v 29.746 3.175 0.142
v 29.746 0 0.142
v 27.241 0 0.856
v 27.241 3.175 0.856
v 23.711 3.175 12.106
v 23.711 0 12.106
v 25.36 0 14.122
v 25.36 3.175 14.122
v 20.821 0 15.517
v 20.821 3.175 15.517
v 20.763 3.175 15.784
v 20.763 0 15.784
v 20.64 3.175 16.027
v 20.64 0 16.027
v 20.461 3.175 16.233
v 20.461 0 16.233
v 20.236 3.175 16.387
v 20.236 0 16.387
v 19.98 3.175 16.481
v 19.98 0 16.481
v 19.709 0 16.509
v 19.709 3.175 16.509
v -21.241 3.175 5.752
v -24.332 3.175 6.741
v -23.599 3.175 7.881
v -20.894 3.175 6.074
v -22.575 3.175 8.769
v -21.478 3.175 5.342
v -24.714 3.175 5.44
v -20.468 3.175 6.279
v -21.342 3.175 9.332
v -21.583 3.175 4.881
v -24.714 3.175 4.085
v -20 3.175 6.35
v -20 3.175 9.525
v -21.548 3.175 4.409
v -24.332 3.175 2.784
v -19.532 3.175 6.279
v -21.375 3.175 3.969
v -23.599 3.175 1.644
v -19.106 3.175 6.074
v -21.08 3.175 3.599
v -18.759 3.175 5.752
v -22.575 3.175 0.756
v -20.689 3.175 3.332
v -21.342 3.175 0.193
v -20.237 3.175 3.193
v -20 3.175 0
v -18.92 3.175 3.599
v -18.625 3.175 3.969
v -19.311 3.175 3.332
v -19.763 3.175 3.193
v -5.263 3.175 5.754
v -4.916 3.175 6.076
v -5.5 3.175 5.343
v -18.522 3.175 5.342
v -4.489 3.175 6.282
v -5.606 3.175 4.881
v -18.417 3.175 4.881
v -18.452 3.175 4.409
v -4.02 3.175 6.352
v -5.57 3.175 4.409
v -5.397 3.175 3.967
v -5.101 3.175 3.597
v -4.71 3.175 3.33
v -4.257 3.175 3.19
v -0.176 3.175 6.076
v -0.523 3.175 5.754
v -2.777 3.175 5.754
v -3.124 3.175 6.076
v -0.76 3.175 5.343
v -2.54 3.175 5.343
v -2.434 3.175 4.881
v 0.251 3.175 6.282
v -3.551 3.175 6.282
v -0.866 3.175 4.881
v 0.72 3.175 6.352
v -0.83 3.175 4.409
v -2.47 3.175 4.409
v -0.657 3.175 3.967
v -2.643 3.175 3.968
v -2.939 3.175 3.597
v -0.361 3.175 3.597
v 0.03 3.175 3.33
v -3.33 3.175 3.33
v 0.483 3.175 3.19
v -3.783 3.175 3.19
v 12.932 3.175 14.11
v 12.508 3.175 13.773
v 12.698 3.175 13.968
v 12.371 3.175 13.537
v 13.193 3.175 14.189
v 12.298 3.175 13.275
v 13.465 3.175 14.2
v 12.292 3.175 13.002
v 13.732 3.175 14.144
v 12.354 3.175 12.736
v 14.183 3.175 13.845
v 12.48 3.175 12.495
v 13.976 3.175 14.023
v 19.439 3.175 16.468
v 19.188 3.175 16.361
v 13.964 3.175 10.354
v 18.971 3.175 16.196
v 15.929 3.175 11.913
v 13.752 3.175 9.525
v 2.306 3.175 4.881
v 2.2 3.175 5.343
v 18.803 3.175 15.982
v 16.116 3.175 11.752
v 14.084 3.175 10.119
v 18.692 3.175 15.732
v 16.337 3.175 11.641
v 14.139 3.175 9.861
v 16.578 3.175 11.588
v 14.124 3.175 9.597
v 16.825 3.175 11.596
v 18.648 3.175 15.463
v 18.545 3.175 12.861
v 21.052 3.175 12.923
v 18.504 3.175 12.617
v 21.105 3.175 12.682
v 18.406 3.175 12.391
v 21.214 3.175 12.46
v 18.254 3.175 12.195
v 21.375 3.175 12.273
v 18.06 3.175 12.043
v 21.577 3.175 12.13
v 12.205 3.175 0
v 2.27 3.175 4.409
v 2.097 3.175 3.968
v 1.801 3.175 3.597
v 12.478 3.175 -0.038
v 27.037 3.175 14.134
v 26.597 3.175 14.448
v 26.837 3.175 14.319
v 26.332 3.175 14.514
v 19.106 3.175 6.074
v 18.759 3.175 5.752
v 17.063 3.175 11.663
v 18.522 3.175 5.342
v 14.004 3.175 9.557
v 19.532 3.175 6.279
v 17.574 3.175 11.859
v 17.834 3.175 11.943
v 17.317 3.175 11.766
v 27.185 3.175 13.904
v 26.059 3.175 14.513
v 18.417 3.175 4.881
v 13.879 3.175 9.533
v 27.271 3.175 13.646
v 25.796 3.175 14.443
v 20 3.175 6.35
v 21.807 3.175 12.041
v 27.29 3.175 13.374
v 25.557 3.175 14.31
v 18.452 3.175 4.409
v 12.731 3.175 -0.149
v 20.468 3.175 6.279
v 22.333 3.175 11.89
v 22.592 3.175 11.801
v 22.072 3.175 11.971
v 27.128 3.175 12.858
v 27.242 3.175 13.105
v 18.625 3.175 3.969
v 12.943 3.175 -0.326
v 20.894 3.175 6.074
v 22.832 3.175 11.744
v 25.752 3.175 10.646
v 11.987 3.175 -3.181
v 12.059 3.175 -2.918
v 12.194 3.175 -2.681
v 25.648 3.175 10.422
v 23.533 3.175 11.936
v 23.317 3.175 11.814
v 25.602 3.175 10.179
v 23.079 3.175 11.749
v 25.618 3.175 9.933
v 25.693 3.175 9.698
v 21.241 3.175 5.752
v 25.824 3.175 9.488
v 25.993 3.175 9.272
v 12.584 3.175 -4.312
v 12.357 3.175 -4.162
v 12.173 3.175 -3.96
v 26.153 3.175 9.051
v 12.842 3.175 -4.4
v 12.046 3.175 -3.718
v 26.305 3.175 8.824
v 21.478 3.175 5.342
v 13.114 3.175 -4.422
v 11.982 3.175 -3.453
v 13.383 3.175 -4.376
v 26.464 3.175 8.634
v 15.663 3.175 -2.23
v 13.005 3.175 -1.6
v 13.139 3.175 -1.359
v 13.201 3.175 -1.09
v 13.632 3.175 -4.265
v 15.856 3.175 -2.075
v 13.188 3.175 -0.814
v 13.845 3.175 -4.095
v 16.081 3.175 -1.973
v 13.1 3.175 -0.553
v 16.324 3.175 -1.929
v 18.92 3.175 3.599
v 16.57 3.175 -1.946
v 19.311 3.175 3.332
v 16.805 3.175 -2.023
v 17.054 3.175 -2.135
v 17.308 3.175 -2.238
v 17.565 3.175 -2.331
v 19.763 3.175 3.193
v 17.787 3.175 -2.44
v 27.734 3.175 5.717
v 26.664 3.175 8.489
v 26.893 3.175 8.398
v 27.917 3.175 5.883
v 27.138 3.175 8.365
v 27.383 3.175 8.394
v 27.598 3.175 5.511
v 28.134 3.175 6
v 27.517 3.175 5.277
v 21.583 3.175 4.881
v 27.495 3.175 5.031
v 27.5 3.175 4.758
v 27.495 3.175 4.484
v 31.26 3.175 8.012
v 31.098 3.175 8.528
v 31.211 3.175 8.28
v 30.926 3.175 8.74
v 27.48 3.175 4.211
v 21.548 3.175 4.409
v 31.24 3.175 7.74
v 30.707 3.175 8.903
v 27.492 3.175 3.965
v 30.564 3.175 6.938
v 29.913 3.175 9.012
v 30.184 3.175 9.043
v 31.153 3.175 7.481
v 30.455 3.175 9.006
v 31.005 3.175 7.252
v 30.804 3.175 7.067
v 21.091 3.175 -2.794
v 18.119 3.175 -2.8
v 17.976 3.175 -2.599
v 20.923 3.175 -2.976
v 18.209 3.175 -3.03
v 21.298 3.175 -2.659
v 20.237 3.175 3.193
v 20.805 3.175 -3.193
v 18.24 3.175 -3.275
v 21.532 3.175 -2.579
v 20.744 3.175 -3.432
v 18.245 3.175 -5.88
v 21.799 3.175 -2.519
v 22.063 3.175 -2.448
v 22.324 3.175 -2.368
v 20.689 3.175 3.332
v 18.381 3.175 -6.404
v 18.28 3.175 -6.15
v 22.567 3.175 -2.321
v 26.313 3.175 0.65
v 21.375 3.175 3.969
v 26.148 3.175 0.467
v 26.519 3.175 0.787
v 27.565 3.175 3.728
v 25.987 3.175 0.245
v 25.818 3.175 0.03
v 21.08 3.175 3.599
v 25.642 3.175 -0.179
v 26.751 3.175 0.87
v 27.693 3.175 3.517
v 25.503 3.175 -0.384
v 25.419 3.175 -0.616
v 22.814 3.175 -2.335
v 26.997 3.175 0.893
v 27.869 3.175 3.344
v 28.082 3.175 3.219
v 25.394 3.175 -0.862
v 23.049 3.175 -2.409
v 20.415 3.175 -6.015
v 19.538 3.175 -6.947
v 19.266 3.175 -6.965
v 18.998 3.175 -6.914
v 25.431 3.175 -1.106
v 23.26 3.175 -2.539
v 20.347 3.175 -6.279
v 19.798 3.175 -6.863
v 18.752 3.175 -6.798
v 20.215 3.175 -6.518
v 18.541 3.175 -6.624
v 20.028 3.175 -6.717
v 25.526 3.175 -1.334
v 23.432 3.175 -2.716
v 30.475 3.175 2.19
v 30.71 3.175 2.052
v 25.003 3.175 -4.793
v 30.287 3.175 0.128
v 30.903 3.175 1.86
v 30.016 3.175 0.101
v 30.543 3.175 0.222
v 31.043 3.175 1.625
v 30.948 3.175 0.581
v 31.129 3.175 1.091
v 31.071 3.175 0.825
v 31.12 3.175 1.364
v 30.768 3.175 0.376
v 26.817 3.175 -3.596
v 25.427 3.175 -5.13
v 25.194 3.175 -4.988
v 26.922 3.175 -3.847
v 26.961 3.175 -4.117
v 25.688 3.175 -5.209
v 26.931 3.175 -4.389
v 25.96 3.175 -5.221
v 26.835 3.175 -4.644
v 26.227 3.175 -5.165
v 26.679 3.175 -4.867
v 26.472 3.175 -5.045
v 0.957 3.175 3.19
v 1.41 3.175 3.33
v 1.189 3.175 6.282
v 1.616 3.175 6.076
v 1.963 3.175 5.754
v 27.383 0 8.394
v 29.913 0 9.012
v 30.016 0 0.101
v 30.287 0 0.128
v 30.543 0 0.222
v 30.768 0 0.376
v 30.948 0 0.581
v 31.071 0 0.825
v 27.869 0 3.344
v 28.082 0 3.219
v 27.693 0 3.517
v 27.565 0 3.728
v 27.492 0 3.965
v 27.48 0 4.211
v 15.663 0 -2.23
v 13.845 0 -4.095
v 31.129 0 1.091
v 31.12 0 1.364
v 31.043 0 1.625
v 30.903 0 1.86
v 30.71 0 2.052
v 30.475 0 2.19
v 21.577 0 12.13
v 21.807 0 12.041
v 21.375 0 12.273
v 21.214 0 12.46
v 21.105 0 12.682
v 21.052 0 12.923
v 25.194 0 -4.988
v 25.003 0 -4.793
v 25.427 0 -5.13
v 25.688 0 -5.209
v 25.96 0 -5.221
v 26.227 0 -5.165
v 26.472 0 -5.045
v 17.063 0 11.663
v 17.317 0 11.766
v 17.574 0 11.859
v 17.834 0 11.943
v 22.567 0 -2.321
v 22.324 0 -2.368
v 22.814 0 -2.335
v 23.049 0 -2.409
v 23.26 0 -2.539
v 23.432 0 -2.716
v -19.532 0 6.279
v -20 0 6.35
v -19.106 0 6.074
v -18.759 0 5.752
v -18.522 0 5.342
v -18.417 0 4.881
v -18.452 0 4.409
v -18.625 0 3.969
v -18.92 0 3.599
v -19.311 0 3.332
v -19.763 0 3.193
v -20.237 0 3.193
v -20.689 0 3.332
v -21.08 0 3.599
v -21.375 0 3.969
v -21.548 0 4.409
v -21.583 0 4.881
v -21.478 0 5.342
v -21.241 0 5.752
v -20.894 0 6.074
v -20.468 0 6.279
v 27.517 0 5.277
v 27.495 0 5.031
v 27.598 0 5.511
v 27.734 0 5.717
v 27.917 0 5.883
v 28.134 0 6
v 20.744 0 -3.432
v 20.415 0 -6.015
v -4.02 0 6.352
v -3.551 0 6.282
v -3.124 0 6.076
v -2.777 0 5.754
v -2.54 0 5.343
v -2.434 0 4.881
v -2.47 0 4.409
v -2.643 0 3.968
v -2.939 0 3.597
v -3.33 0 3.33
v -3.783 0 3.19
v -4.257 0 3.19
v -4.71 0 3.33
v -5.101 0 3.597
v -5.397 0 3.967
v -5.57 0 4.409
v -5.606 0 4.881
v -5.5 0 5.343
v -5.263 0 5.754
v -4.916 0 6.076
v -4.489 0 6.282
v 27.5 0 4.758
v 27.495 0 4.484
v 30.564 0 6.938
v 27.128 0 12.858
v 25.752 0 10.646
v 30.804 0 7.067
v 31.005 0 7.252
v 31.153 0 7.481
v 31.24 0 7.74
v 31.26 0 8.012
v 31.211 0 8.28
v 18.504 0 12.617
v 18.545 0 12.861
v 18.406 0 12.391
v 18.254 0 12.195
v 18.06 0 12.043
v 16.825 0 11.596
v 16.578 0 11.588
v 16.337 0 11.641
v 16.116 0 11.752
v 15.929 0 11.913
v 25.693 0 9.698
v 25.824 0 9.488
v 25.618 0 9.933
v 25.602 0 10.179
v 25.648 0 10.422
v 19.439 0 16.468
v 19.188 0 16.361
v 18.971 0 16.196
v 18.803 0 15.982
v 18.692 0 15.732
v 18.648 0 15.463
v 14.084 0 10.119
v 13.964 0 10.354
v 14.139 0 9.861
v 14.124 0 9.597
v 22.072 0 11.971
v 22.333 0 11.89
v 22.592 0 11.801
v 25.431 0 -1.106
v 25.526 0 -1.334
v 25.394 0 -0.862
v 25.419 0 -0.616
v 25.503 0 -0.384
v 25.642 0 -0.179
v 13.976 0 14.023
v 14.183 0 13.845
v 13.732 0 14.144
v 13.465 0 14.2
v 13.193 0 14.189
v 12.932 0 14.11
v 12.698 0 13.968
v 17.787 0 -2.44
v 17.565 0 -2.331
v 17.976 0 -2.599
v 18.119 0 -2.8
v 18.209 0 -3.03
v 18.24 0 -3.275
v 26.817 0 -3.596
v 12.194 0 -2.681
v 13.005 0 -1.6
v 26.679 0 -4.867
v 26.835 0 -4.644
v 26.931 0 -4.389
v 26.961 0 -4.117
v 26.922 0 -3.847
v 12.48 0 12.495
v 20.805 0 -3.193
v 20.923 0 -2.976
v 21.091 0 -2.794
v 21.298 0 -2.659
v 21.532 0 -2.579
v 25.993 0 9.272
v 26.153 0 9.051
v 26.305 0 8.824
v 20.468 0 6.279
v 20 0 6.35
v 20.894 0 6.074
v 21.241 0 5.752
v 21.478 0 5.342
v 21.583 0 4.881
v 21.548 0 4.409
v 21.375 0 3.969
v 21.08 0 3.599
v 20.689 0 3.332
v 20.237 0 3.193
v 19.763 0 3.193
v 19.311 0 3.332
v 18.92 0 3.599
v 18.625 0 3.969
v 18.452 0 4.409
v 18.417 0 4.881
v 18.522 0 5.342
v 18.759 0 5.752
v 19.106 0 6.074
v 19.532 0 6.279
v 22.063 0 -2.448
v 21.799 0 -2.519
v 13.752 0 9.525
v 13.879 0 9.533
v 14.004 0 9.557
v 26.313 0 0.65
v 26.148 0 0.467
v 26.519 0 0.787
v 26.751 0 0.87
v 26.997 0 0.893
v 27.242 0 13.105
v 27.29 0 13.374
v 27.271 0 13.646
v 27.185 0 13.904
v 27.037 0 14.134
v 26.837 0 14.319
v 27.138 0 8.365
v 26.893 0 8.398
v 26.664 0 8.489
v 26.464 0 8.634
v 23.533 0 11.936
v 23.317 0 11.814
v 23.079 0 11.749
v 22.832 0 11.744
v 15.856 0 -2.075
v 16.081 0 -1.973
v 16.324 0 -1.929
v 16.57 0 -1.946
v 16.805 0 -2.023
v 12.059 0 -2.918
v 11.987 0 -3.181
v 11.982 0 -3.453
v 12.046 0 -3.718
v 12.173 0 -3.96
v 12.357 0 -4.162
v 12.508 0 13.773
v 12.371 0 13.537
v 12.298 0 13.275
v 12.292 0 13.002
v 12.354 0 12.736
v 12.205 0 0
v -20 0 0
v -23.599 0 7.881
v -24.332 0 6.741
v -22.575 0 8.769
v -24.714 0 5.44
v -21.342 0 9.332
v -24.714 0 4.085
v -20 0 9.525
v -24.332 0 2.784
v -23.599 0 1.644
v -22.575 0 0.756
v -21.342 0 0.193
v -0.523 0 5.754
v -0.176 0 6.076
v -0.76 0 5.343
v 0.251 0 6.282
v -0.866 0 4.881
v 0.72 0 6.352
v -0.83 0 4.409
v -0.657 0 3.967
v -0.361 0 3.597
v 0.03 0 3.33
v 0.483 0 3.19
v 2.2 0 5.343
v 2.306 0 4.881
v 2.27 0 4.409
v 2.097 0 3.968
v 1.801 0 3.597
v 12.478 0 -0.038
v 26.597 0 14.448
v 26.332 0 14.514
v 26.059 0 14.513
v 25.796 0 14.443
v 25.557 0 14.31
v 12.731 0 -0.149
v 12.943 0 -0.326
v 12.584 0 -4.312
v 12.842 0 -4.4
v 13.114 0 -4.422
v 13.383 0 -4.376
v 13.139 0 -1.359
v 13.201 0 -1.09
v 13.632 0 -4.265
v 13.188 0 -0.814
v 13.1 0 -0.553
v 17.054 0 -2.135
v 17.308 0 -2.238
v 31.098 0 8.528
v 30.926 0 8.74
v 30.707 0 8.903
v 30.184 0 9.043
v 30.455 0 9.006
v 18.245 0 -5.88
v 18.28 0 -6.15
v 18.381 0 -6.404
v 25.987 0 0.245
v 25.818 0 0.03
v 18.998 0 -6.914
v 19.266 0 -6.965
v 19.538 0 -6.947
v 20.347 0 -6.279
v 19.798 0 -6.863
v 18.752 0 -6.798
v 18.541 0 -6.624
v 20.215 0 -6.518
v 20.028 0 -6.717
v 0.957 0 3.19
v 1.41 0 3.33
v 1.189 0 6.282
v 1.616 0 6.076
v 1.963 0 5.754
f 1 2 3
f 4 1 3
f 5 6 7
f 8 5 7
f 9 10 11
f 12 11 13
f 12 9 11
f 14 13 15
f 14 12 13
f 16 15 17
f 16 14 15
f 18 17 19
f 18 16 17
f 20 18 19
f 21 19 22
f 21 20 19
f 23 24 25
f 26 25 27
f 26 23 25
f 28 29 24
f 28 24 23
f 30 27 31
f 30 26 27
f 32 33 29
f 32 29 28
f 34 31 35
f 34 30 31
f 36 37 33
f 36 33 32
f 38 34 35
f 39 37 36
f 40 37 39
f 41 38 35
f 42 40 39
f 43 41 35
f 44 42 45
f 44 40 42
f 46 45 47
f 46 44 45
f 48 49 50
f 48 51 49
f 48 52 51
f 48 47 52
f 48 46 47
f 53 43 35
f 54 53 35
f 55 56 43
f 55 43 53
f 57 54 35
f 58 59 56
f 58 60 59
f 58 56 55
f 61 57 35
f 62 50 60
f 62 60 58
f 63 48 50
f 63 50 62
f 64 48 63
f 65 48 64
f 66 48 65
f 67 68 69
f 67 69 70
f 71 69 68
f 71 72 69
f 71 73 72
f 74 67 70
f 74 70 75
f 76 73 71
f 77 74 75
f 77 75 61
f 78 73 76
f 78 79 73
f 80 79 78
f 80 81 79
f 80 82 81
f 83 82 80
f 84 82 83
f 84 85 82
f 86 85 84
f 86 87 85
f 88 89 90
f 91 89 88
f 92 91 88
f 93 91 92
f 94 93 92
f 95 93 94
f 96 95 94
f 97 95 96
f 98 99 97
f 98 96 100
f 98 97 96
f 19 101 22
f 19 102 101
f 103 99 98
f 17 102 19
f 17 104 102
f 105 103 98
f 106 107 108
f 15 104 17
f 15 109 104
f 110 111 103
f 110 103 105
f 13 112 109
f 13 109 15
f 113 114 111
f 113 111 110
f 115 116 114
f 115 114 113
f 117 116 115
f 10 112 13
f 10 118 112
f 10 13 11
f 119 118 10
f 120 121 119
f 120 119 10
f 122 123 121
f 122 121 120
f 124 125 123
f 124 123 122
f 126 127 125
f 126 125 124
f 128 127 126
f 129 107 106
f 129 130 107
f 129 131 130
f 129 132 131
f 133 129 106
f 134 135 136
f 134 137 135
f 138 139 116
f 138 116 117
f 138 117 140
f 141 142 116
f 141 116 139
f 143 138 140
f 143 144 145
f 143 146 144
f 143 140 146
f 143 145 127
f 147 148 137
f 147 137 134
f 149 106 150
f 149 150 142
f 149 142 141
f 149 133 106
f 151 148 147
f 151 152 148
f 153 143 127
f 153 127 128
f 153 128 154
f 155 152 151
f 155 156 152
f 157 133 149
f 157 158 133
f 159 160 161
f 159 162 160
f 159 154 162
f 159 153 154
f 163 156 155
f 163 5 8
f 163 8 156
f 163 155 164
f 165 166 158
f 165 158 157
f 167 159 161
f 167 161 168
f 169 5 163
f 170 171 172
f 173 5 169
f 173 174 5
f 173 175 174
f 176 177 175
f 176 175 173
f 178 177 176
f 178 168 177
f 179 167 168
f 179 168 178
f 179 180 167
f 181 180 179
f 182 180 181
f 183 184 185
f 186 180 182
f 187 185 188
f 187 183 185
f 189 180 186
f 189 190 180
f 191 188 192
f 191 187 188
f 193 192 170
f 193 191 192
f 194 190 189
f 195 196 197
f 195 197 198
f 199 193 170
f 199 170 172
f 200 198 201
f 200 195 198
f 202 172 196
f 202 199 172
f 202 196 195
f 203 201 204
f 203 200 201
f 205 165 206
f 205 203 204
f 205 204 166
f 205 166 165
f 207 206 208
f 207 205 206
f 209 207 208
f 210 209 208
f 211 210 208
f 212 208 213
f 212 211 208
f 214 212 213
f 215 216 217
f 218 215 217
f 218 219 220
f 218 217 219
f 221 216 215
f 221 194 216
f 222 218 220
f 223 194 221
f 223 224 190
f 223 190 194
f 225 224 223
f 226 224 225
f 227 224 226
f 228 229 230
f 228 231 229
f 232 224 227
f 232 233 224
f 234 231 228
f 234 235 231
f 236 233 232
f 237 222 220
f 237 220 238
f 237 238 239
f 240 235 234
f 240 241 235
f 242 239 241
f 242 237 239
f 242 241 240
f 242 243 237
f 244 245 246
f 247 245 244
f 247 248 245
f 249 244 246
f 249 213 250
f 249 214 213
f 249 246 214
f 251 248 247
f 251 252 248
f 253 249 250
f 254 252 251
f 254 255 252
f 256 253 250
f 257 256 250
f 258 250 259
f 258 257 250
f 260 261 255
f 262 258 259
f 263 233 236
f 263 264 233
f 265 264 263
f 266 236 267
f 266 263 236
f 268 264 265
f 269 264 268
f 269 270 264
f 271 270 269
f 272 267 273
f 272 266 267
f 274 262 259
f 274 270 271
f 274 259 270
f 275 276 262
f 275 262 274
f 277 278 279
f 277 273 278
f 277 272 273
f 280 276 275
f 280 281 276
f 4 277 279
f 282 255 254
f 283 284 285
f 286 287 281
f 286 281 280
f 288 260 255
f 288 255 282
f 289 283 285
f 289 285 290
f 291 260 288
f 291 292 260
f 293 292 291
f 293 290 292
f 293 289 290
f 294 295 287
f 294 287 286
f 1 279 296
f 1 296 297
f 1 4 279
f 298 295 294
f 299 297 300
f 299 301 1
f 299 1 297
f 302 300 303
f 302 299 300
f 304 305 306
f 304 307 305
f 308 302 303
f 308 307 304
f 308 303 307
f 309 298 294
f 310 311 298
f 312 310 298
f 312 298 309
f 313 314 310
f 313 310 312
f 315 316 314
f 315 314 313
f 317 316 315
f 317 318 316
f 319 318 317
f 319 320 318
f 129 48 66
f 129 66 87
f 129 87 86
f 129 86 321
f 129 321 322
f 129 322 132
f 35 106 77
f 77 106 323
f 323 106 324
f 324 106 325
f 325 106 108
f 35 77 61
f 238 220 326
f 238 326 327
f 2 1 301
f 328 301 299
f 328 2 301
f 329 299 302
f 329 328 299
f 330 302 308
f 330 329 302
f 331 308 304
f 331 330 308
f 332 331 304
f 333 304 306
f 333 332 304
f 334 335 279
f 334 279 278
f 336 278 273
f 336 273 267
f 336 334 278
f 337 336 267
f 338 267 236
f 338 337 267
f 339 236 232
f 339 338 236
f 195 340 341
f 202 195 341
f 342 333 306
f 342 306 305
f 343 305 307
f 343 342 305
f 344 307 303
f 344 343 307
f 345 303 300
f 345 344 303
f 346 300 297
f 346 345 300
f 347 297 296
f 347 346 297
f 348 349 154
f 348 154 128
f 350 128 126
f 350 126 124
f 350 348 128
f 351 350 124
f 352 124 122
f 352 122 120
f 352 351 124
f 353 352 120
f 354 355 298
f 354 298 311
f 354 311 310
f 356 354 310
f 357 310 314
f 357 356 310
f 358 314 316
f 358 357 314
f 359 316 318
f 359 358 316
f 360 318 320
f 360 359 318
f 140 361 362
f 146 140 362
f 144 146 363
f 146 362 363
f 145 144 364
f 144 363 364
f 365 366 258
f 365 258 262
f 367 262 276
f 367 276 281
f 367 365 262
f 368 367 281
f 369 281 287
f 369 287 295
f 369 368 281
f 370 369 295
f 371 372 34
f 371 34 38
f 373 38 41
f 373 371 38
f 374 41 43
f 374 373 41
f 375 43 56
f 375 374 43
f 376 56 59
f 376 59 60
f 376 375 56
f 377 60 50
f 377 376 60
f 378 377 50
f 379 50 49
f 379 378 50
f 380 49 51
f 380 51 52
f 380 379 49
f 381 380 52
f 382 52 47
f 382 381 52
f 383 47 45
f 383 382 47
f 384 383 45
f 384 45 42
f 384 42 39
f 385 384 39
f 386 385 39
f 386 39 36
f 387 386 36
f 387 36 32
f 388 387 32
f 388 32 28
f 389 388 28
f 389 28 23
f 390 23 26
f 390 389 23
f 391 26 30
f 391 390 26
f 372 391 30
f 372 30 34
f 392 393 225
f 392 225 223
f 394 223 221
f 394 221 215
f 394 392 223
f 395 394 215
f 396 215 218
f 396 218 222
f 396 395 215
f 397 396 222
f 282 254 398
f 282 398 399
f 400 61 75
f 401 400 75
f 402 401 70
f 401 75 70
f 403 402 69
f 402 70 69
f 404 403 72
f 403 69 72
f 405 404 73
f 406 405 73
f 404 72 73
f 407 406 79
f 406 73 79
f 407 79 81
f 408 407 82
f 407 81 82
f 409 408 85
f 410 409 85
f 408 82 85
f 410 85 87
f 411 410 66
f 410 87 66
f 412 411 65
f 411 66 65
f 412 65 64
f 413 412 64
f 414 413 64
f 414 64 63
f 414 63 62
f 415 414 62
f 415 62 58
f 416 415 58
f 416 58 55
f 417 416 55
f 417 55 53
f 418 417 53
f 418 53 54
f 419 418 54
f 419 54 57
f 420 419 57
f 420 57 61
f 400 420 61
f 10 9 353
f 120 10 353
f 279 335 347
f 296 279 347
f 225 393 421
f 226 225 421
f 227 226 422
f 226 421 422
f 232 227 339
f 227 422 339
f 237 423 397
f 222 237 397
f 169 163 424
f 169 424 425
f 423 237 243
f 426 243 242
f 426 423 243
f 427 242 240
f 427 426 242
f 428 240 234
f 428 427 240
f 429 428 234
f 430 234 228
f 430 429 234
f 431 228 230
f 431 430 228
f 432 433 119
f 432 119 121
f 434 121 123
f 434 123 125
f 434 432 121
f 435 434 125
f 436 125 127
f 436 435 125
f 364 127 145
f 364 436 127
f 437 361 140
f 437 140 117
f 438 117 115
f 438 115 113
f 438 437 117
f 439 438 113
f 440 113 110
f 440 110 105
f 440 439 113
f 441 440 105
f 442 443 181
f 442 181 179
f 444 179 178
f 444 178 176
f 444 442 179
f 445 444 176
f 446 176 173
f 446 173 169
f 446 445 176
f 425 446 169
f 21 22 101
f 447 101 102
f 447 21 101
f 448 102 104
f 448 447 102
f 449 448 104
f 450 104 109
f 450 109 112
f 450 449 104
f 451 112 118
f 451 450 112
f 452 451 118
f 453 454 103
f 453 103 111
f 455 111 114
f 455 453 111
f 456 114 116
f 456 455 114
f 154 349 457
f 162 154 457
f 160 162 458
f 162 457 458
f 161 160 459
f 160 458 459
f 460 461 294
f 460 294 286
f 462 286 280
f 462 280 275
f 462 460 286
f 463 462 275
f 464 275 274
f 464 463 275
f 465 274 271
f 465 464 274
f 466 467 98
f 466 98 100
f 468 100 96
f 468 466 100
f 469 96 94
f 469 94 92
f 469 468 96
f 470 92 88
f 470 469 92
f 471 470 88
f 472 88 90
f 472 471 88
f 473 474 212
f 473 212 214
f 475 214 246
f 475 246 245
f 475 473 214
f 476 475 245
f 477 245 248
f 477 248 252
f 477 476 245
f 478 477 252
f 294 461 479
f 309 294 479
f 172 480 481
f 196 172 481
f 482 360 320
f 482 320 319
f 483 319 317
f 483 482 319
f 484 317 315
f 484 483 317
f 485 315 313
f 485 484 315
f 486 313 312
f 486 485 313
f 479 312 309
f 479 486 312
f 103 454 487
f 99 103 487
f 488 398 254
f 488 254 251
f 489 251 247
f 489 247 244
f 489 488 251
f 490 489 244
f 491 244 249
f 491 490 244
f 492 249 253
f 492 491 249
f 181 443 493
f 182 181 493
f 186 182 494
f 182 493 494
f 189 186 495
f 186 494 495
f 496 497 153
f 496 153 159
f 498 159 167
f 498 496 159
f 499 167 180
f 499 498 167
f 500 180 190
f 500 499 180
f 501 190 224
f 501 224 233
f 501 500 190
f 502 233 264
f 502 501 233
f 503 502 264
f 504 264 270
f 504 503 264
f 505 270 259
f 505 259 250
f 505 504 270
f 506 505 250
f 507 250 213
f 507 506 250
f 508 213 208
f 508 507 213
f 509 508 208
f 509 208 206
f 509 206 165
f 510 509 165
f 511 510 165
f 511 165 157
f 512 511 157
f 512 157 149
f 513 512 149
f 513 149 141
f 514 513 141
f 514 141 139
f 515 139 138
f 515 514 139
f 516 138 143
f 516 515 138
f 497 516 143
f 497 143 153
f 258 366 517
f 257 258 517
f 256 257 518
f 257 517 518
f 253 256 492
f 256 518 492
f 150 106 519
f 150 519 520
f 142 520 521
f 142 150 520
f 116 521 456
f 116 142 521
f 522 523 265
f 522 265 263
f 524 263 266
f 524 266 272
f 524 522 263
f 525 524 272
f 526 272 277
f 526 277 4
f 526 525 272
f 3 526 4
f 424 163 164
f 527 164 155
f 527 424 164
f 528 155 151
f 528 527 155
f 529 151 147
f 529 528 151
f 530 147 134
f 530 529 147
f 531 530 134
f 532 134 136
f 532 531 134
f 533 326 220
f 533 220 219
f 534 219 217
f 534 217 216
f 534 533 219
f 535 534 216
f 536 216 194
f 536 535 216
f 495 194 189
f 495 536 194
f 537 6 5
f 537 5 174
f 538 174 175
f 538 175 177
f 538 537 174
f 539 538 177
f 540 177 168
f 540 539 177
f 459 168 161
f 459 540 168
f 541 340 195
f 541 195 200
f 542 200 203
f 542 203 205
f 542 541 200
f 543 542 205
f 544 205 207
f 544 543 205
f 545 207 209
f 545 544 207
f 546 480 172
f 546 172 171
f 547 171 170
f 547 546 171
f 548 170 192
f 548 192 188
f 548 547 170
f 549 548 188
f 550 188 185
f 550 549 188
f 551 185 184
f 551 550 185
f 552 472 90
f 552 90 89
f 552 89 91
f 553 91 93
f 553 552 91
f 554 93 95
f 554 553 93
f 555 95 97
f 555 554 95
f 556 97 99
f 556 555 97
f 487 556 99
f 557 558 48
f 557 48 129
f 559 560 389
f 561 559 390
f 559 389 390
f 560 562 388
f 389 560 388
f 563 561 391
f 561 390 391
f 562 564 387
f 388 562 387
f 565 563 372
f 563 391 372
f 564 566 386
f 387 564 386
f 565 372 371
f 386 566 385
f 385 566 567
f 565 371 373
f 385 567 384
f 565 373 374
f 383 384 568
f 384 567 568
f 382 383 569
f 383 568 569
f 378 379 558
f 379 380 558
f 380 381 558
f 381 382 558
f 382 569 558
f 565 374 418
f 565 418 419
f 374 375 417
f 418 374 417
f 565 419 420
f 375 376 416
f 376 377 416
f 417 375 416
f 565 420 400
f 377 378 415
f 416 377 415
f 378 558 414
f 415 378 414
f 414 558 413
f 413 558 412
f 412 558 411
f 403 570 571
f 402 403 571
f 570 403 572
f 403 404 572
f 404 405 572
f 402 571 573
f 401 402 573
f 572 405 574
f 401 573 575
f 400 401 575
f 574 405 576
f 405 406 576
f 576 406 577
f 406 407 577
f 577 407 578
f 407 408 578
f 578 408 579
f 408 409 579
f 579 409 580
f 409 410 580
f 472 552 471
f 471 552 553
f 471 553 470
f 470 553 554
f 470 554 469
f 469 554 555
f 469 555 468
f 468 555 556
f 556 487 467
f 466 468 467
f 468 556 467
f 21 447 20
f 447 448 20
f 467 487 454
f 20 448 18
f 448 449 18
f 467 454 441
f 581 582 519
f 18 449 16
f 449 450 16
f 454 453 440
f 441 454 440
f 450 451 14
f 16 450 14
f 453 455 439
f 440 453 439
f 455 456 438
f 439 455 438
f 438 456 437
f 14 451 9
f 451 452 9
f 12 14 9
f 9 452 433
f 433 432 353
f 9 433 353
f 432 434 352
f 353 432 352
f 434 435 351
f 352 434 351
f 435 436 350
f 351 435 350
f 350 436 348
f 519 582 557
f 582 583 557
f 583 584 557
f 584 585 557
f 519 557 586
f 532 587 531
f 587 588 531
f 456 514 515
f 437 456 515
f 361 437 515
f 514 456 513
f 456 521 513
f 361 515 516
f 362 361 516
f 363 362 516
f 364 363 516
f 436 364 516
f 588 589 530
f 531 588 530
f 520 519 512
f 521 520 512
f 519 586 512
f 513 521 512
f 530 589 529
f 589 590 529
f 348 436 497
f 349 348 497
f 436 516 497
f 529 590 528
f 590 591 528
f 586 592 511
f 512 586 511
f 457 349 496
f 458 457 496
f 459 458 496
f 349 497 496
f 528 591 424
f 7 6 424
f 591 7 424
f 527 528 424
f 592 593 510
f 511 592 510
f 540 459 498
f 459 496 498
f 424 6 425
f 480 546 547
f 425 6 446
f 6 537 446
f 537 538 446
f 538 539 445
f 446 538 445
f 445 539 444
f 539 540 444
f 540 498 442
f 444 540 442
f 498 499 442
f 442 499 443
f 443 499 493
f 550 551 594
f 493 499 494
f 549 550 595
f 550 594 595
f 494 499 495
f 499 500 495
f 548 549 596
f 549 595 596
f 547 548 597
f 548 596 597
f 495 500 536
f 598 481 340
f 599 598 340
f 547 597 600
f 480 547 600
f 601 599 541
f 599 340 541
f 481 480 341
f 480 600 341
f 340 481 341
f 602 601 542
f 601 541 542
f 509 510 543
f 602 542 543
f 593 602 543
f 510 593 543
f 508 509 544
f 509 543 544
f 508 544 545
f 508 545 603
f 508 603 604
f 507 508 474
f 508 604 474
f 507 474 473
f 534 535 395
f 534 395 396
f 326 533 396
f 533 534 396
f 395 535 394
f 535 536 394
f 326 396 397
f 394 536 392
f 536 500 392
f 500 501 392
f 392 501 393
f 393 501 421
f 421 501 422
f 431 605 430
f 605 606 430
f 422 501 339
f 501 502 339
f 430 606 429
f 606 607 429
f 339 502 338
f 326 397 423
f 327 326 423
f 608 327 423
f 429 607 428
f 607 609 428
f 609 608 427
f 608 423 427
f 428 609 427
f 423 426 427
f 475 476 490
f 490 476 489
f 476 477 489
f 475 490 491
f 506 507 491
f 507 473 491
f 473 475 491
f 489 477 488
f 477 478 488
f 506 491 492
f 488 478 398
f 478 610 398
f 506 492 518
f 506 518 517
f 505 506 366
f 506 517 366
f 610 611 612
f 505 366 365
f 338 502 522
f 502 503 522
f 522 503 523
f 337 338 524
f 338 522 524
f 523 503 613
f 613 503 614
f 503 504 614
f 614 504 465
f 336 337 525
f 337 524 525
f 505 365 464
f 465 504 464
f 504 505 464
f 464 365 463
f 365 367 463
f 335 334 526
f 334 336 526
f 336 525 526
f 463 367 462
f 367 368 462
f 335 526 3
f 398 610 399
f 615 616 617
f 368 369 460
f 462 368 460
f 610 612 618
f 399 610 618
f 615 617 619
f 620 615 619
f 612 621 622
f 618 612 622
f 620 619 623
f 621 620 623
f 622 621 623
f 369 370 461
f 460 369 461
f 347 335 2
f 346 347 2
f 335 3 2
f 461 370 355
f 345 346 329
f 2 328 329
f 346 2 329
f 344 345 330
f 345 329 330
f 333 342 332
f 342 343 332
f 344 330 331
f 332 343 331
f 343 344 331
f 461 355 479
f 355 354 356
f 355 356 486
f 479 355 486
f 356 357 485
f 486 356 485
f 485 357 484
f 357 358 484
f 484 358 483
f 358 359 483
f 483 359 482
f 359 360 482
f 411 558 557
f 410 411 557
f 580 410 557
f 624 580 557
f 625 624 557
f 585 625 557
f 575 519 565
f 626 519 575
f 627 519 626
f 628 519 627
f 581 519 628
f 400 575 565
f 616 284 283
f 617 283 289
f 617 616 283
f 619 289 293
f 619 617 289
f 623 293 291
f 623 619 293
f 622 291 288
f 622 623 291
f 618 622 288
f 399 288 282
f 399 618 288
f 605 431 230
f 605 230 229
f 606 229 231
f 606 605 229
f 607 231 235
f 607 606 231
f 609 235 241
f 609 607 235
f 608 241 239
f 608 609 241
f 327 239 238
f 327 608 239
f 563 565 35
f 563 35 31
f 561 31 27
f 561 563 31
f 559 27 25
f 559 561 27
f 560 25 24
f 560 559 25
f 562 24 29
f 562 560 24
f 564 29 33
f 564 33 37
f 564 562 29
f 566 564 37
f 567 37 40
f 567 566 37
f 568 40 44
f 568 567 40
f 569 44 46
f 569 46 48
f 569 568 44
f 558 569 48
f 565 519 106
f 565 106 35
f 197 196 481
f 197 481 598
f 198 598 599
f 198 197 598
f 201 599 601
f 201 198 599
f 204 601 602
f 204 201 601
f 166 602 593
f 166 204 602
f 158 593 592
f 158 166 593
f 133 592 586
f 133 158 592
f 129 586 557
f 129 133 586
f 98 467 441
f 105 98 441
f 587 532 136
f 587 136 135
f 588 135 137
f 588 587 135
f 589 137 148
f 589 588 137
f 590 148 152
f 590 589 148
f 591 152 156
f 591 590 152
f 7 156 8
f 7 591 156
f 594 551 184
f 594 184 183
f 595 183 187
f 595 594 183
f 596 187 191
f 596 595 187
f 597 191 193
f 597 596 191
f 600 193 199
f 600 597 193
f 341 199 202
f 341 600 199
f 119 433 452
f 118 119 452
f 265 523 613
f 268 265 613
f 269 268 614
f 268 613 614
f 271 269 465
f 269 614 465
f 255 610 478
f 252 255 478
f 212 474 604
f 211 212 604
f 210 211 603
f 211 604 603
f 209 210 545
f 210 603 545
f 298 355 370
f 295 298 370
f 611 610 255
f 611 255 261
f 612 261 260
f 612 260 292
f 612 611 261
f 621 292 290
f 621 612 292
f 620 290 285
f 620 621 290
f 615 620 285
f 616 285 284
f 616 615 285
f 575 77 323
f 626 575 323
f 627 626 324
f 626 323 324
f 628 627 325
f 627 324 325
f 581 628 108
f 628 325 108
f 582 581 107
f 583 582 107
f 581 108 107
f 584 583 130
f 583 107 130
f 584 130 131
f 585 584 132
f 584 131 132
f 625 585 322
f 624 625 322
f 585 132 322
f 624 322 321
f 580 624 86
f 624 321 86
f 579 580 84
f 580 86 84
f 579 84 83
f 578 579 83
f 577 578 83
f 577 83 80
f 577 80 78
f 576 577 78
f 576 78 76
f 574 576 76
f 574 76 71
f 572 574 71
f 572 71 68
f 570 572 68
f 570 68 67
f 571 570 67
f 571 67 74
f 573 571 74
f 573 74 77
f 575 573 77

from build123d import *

# Parameters (mm, degrees)
CROQUIS1_R              = 1.5875
SALIENTE_EXTRUIR1_DEPTH = 3.175
SALIENTE_EXTRUIR2_START = -3.175
CROQUIS2_R              = 7.5
CROQUIS2_R_2            = 1.5875
SALIENTE_EXTRUIR2_DEPTH = 3.175
SALIENTE_EXTRUIR3_START = -3.175
SALIENTE_EXTRUIR3_DEPTH = 3.175
CORTAR_EXTRUIR4_START   = -10
CORTAR_EXTRUIR4_DEPTH   = 10
MATRIZC1_COUNT          = 8
MATRIZC1_ANGLE          = 259
REDONDEO1_R             = 1
ESQUISSE1_R             = 1.59
ENL_V_MAT_EXTRU_1_DEPTH = 36.494905734


with BuildPart() as part:
    # Croquis1 → Saliente-Extruir1 (new body)
    with BuildSketch(Plane(origin=(0, 0, 0), x_dir=(1, 0, 0), z_dir=(0, 1, 0))):
        with BuildLine():
            Line((-20, 0), (20, 0))
            ThreePointArc((20, 0), (24.7625, -4.7625), (20, -9.525))
            Line((20, -9.525), (-20, -9.525))
            ThreePointArc((-20, -9.525), (-24.7625, -4.7625), (-20, 0))
        make_face()
        with Locations(Location((-20, -4.7625, 0), (0, 0, 270))):
            Circle(CROQUIS1_R, mode=Mode.SUBTRACT)
        with Locations(Location((20, -4.7625, 0), (0, 0, 270))):
            Circle(CROQUIS1_R, mode=Mode.SUBTRACT)
    extrude(amount=SALIENTE_EXTRUIR1_DEPTH)

    # Croquis2 → Saliente-Extruir2 (add)
    with BuildSketch(Plane(origin=(0, 3.175, 0), x_dir=(1, 0, 0), z_dir=(0, 1, 0)).offset(SALIENTE_EXTRUIR2_START)):
        with Locations((20, -4.7625)):
            Circle(CROQUIS2_R)
        with Locations(Location((20, -4.7625, 0), (0, 0, 270))):
            Circle(CROQUIS2_R_2, mode=Mode.SUBTRACT)
    extrude(amount=SALIENTE_EXTRUIR2_DEPTH)

    # Croquis8 → Saliente-Extruir3 (add)
    with BuildSketch(Plane(origin=(0, 3.175, 0), x_dir=(1, 0, 0), z_dir=(0, 1, 0)).offset(SALIENTE_EXTRUIR3_START)):
        with BuildLine():
            Line((11.607813982, 3.461471902), (14.206158981, 0))
            ThreePointArc((14.206158981, 0), (15.121179891, 0.933736858), (16.184441281, 1.694396442))
            Line((16.184441281, 1.694396442), (13.163387879, 4.793819098))
            ThreePointArc((13.163387879, 4.793819098), (12.356515163, 4.161604411), (11.607813982, 3.461471902))
        make_face()
    saliente_extruir3 = extrude(amount=SALIENTE_EXTRUIR3_DEPTH)

    # Croquis9 → Cortar-Extruir4 (cut)
    with BuildSketch(Plane(origin=(0, 3.175, 0), x_dir=(1, 0, 0), z_dir=(0, 1, 0)).offset(CORTAR_EXTRUIR4_START)):
        with BuildLine():
            ThreePointArc((12.35651523, 4.161604469), (11.974526132, 3.819706546), (11.607813982, 3.461471902))
            Line((11.607813982, 3.461471902), (12.19397403, 2.680599255))
            ThreePointArc((12.19397403, 2.680599255), (11.982381708, 3.453243741), (12.35651523, 4.161604469))
        make_face()
        with BuildLine():
            ThreePointArc((13.163387879, 4.793819098), (12.753054069, 4.486514795), (12.35651523, 4.161604469))
            ThreePointArc((12.35651523, 4.161604469), (13.113956627, 4.422436237), (13.844906618, 4.094621057))
            Line((13.844906618, 4.094621057), (13.163387879, 4.793819098))
        make_face()
    cortar_extruir4 = extrude(amount=CORTAR_EXTRUIR4_DEPTH, mode=Mode.SUBTRACT)

    # MatrizC1: Saliente-Extruir3, Cortar-Extruir4 ×8 about axis
    matrizc1_axis = Axis((20, 0, 4.7625), (0, -1, 0))
    add([saliente_extruir3.rotate(matrizc1_axis, i * MATRIZC1_ANGLE / (MATRIZC1_COUNT - 1)) for i in range(1, MATRIZC1_COUNT)])
    add([cortar_extruir4.rotate(matrizc1_axis, i * MATRIZC1_ANGLE / (MATRIZC1_COUNT - 1)) for i in range(1, MATRIZC1_COUNT)], mode=Mode.SUBTRACT)

    # Redondeo1
    # the kernel refuses this fillet: 1 mm, written as the material it adds along each edge
    with BuildSketch(Plane(origin=(27.395406089, 0, 3.514313802), x_dir=(0.12009264391370789, 0, 0.9927626891044079), z_dir=(0, 1, 0)), Plane(origin=(26.657411119, 0, 8.216320666), x_dir=(-0.501549250802915, 0, 0.8651290938461349), z_dir=(0, 1, 0)), Plane(origin=(23.238283761, 0, 11.527373856), x_dir=(-0.9212027273713431, 0, 0.389082941136718), z_dir=(0, 1, 0)), Plane(origin=(18.515005687, 0, 12.114016299), x_dir=(-0.9698611692594302, 0, -0.243658187555294), z_dir=(0, 1, 0)), Plane(origin=(14.389777858, 0, 9.739990082), x_dir=(-0.6279284118017822, 0, -0.7782711029275668), z_dir=(0, 1, 0)), Plane(origin=(16.184441281, 0, -1.694396442), x_dir=(0.8837864601497757, 0, -0.4678904710035554), z_dir=(0, 1, 0)), Plane(origin=(20.838616598, 0, -2.690467342), x_dir=(0.9874067650142349, 0, 0.15820202402031353), z_dir=(0, 1, 0)), Plane(origin=(25.155056708, 0, -0.685012307), x_dir=(0.6933697506528057, 0, 0.7205819792915072), z_dir=(0, 1, 0))) as redondeo1_piece_1:
        with BuildLine():
            CenterArc((0.748840141, 0.998904162), REDONDEO1_R, 196.368950511, 70.948483307)
            Line((-0.210626698, 0.717082614), (0, 0))
            ThreePointArc((0, 0), (0.351018816, 0.008218784), (0.702037632, 0))
        make_face()
    extrude(amount=3.175)
    with BuildSketch(Plane(origin=(26.522503707, 0, 1.06021079), x_dir=(0.9617717559465732, 0, -0.2738523132336944), z_dir=(0, 1, 0)), Plane(origin=(27.437196341, 0, 5.731061088), x_dir=(0.9329135130884484, 0, 0.36010050971495355), z_dir=(0, 1, 0)), Plane(origin=(25.35671448, 0, 10.011843767), x_dir=(0.5283439627642348, 0, 0.8490304217226758), z_dir=(0, 1, 0)), Plane(origin=(21.11892846, 0, 12.178563585), x_dir=(-0.0890050127232042, 0, 0.9960311780813601), z_dir=(0, 1, 0)), Plane(origin=(16.430517523, 0, 11.358619681), x_dir=(-0.6705090902301596, 0, 0.7419013141373477), z_dir=(0, 1, 0)), Plane(origin=(18.238976871, 0, -2.527822183), x_dir=(0.0018564846529317855, 0, -0.9999982767308818), z_dir=(0, 1, 0)), Plane(origin=(22.981009808, 0, -2.119620351), x_dir=(0.6032966406304949, 0, -0.7975168734289948), z_dir=(0, 1, 0))) as redondeo1_piece_2:
        with BuildLine():
            CenterArc((0.747376131, 1), REDONDEO1_R, 199.051516693, 70.948483307)
            ThreePointArc((-0.197849332, 0.673581828), (-0.091039016, 0.339107144), (0, 0))
            Line((0, 0), (0.747376131, 0))
        make_face()
    extrude(amount=3.175)
    with BuildSketch(Plane(origin=(14.206158981, 3.175, 0), x_dir=(-1, 0, 0), z_dir=(0, -1, 0))) as redondeo1_piece_3:
        with BuildLine():
            CenterArc((REDONDEO1_R * 2.00103600097, REDONDEO1_R), REDONDEO1_R, 143.106368796, 126.893631204)
            Line((REDONDEO1_R * 1.20128460683, REDONDEO1_R * 1.6003313315), (0, 0))
            Line((0, 0), (REDONDEO1_R * 2.00103600097, 0))
        make_face()
    extrude(amount=3.175)
    with BuildSketch(Plane(origin=(14.206158981, 3.175, 9.525), x_dir=(-1, 0, 0), z_dir=(0, -1, 0))) as redondeo1_piece_4:
        with BuildLine():
            CenterArc((0.454646298, -1), REDONDEO1_R, 90, 47.317031956)
            ThreePointArc((-0.280469857, -0.322058824), (-0.137942125, -0.163026135), (0, 0))
            Line((0, 0), (0.454646298, 0))
        make_face()
    extrude(amount=3.175)

    # Esquisse1 → Enlèv. mat.-Extru.1 (cut, through all)
    with BuildSketch(Plane(origin=(0, 3.175, 0), x_dir=(1, 0, 0), z_dir=(0, 1, 0))):
        with Locations(Location((0.72, -4.7625, 0), (0, 0, 270))):
            Circle(ESQUISSE1_R)
        with Locations(Location((-4.02, -4.7625, 0), (0, 0, 270))):
            Circle(ESQUISSE1_R)
    extrude(amount=-ENL_V_MAT_EXTRU_1_DEPTH, mode=Mode.SUBTRACT)


solid = part.part
